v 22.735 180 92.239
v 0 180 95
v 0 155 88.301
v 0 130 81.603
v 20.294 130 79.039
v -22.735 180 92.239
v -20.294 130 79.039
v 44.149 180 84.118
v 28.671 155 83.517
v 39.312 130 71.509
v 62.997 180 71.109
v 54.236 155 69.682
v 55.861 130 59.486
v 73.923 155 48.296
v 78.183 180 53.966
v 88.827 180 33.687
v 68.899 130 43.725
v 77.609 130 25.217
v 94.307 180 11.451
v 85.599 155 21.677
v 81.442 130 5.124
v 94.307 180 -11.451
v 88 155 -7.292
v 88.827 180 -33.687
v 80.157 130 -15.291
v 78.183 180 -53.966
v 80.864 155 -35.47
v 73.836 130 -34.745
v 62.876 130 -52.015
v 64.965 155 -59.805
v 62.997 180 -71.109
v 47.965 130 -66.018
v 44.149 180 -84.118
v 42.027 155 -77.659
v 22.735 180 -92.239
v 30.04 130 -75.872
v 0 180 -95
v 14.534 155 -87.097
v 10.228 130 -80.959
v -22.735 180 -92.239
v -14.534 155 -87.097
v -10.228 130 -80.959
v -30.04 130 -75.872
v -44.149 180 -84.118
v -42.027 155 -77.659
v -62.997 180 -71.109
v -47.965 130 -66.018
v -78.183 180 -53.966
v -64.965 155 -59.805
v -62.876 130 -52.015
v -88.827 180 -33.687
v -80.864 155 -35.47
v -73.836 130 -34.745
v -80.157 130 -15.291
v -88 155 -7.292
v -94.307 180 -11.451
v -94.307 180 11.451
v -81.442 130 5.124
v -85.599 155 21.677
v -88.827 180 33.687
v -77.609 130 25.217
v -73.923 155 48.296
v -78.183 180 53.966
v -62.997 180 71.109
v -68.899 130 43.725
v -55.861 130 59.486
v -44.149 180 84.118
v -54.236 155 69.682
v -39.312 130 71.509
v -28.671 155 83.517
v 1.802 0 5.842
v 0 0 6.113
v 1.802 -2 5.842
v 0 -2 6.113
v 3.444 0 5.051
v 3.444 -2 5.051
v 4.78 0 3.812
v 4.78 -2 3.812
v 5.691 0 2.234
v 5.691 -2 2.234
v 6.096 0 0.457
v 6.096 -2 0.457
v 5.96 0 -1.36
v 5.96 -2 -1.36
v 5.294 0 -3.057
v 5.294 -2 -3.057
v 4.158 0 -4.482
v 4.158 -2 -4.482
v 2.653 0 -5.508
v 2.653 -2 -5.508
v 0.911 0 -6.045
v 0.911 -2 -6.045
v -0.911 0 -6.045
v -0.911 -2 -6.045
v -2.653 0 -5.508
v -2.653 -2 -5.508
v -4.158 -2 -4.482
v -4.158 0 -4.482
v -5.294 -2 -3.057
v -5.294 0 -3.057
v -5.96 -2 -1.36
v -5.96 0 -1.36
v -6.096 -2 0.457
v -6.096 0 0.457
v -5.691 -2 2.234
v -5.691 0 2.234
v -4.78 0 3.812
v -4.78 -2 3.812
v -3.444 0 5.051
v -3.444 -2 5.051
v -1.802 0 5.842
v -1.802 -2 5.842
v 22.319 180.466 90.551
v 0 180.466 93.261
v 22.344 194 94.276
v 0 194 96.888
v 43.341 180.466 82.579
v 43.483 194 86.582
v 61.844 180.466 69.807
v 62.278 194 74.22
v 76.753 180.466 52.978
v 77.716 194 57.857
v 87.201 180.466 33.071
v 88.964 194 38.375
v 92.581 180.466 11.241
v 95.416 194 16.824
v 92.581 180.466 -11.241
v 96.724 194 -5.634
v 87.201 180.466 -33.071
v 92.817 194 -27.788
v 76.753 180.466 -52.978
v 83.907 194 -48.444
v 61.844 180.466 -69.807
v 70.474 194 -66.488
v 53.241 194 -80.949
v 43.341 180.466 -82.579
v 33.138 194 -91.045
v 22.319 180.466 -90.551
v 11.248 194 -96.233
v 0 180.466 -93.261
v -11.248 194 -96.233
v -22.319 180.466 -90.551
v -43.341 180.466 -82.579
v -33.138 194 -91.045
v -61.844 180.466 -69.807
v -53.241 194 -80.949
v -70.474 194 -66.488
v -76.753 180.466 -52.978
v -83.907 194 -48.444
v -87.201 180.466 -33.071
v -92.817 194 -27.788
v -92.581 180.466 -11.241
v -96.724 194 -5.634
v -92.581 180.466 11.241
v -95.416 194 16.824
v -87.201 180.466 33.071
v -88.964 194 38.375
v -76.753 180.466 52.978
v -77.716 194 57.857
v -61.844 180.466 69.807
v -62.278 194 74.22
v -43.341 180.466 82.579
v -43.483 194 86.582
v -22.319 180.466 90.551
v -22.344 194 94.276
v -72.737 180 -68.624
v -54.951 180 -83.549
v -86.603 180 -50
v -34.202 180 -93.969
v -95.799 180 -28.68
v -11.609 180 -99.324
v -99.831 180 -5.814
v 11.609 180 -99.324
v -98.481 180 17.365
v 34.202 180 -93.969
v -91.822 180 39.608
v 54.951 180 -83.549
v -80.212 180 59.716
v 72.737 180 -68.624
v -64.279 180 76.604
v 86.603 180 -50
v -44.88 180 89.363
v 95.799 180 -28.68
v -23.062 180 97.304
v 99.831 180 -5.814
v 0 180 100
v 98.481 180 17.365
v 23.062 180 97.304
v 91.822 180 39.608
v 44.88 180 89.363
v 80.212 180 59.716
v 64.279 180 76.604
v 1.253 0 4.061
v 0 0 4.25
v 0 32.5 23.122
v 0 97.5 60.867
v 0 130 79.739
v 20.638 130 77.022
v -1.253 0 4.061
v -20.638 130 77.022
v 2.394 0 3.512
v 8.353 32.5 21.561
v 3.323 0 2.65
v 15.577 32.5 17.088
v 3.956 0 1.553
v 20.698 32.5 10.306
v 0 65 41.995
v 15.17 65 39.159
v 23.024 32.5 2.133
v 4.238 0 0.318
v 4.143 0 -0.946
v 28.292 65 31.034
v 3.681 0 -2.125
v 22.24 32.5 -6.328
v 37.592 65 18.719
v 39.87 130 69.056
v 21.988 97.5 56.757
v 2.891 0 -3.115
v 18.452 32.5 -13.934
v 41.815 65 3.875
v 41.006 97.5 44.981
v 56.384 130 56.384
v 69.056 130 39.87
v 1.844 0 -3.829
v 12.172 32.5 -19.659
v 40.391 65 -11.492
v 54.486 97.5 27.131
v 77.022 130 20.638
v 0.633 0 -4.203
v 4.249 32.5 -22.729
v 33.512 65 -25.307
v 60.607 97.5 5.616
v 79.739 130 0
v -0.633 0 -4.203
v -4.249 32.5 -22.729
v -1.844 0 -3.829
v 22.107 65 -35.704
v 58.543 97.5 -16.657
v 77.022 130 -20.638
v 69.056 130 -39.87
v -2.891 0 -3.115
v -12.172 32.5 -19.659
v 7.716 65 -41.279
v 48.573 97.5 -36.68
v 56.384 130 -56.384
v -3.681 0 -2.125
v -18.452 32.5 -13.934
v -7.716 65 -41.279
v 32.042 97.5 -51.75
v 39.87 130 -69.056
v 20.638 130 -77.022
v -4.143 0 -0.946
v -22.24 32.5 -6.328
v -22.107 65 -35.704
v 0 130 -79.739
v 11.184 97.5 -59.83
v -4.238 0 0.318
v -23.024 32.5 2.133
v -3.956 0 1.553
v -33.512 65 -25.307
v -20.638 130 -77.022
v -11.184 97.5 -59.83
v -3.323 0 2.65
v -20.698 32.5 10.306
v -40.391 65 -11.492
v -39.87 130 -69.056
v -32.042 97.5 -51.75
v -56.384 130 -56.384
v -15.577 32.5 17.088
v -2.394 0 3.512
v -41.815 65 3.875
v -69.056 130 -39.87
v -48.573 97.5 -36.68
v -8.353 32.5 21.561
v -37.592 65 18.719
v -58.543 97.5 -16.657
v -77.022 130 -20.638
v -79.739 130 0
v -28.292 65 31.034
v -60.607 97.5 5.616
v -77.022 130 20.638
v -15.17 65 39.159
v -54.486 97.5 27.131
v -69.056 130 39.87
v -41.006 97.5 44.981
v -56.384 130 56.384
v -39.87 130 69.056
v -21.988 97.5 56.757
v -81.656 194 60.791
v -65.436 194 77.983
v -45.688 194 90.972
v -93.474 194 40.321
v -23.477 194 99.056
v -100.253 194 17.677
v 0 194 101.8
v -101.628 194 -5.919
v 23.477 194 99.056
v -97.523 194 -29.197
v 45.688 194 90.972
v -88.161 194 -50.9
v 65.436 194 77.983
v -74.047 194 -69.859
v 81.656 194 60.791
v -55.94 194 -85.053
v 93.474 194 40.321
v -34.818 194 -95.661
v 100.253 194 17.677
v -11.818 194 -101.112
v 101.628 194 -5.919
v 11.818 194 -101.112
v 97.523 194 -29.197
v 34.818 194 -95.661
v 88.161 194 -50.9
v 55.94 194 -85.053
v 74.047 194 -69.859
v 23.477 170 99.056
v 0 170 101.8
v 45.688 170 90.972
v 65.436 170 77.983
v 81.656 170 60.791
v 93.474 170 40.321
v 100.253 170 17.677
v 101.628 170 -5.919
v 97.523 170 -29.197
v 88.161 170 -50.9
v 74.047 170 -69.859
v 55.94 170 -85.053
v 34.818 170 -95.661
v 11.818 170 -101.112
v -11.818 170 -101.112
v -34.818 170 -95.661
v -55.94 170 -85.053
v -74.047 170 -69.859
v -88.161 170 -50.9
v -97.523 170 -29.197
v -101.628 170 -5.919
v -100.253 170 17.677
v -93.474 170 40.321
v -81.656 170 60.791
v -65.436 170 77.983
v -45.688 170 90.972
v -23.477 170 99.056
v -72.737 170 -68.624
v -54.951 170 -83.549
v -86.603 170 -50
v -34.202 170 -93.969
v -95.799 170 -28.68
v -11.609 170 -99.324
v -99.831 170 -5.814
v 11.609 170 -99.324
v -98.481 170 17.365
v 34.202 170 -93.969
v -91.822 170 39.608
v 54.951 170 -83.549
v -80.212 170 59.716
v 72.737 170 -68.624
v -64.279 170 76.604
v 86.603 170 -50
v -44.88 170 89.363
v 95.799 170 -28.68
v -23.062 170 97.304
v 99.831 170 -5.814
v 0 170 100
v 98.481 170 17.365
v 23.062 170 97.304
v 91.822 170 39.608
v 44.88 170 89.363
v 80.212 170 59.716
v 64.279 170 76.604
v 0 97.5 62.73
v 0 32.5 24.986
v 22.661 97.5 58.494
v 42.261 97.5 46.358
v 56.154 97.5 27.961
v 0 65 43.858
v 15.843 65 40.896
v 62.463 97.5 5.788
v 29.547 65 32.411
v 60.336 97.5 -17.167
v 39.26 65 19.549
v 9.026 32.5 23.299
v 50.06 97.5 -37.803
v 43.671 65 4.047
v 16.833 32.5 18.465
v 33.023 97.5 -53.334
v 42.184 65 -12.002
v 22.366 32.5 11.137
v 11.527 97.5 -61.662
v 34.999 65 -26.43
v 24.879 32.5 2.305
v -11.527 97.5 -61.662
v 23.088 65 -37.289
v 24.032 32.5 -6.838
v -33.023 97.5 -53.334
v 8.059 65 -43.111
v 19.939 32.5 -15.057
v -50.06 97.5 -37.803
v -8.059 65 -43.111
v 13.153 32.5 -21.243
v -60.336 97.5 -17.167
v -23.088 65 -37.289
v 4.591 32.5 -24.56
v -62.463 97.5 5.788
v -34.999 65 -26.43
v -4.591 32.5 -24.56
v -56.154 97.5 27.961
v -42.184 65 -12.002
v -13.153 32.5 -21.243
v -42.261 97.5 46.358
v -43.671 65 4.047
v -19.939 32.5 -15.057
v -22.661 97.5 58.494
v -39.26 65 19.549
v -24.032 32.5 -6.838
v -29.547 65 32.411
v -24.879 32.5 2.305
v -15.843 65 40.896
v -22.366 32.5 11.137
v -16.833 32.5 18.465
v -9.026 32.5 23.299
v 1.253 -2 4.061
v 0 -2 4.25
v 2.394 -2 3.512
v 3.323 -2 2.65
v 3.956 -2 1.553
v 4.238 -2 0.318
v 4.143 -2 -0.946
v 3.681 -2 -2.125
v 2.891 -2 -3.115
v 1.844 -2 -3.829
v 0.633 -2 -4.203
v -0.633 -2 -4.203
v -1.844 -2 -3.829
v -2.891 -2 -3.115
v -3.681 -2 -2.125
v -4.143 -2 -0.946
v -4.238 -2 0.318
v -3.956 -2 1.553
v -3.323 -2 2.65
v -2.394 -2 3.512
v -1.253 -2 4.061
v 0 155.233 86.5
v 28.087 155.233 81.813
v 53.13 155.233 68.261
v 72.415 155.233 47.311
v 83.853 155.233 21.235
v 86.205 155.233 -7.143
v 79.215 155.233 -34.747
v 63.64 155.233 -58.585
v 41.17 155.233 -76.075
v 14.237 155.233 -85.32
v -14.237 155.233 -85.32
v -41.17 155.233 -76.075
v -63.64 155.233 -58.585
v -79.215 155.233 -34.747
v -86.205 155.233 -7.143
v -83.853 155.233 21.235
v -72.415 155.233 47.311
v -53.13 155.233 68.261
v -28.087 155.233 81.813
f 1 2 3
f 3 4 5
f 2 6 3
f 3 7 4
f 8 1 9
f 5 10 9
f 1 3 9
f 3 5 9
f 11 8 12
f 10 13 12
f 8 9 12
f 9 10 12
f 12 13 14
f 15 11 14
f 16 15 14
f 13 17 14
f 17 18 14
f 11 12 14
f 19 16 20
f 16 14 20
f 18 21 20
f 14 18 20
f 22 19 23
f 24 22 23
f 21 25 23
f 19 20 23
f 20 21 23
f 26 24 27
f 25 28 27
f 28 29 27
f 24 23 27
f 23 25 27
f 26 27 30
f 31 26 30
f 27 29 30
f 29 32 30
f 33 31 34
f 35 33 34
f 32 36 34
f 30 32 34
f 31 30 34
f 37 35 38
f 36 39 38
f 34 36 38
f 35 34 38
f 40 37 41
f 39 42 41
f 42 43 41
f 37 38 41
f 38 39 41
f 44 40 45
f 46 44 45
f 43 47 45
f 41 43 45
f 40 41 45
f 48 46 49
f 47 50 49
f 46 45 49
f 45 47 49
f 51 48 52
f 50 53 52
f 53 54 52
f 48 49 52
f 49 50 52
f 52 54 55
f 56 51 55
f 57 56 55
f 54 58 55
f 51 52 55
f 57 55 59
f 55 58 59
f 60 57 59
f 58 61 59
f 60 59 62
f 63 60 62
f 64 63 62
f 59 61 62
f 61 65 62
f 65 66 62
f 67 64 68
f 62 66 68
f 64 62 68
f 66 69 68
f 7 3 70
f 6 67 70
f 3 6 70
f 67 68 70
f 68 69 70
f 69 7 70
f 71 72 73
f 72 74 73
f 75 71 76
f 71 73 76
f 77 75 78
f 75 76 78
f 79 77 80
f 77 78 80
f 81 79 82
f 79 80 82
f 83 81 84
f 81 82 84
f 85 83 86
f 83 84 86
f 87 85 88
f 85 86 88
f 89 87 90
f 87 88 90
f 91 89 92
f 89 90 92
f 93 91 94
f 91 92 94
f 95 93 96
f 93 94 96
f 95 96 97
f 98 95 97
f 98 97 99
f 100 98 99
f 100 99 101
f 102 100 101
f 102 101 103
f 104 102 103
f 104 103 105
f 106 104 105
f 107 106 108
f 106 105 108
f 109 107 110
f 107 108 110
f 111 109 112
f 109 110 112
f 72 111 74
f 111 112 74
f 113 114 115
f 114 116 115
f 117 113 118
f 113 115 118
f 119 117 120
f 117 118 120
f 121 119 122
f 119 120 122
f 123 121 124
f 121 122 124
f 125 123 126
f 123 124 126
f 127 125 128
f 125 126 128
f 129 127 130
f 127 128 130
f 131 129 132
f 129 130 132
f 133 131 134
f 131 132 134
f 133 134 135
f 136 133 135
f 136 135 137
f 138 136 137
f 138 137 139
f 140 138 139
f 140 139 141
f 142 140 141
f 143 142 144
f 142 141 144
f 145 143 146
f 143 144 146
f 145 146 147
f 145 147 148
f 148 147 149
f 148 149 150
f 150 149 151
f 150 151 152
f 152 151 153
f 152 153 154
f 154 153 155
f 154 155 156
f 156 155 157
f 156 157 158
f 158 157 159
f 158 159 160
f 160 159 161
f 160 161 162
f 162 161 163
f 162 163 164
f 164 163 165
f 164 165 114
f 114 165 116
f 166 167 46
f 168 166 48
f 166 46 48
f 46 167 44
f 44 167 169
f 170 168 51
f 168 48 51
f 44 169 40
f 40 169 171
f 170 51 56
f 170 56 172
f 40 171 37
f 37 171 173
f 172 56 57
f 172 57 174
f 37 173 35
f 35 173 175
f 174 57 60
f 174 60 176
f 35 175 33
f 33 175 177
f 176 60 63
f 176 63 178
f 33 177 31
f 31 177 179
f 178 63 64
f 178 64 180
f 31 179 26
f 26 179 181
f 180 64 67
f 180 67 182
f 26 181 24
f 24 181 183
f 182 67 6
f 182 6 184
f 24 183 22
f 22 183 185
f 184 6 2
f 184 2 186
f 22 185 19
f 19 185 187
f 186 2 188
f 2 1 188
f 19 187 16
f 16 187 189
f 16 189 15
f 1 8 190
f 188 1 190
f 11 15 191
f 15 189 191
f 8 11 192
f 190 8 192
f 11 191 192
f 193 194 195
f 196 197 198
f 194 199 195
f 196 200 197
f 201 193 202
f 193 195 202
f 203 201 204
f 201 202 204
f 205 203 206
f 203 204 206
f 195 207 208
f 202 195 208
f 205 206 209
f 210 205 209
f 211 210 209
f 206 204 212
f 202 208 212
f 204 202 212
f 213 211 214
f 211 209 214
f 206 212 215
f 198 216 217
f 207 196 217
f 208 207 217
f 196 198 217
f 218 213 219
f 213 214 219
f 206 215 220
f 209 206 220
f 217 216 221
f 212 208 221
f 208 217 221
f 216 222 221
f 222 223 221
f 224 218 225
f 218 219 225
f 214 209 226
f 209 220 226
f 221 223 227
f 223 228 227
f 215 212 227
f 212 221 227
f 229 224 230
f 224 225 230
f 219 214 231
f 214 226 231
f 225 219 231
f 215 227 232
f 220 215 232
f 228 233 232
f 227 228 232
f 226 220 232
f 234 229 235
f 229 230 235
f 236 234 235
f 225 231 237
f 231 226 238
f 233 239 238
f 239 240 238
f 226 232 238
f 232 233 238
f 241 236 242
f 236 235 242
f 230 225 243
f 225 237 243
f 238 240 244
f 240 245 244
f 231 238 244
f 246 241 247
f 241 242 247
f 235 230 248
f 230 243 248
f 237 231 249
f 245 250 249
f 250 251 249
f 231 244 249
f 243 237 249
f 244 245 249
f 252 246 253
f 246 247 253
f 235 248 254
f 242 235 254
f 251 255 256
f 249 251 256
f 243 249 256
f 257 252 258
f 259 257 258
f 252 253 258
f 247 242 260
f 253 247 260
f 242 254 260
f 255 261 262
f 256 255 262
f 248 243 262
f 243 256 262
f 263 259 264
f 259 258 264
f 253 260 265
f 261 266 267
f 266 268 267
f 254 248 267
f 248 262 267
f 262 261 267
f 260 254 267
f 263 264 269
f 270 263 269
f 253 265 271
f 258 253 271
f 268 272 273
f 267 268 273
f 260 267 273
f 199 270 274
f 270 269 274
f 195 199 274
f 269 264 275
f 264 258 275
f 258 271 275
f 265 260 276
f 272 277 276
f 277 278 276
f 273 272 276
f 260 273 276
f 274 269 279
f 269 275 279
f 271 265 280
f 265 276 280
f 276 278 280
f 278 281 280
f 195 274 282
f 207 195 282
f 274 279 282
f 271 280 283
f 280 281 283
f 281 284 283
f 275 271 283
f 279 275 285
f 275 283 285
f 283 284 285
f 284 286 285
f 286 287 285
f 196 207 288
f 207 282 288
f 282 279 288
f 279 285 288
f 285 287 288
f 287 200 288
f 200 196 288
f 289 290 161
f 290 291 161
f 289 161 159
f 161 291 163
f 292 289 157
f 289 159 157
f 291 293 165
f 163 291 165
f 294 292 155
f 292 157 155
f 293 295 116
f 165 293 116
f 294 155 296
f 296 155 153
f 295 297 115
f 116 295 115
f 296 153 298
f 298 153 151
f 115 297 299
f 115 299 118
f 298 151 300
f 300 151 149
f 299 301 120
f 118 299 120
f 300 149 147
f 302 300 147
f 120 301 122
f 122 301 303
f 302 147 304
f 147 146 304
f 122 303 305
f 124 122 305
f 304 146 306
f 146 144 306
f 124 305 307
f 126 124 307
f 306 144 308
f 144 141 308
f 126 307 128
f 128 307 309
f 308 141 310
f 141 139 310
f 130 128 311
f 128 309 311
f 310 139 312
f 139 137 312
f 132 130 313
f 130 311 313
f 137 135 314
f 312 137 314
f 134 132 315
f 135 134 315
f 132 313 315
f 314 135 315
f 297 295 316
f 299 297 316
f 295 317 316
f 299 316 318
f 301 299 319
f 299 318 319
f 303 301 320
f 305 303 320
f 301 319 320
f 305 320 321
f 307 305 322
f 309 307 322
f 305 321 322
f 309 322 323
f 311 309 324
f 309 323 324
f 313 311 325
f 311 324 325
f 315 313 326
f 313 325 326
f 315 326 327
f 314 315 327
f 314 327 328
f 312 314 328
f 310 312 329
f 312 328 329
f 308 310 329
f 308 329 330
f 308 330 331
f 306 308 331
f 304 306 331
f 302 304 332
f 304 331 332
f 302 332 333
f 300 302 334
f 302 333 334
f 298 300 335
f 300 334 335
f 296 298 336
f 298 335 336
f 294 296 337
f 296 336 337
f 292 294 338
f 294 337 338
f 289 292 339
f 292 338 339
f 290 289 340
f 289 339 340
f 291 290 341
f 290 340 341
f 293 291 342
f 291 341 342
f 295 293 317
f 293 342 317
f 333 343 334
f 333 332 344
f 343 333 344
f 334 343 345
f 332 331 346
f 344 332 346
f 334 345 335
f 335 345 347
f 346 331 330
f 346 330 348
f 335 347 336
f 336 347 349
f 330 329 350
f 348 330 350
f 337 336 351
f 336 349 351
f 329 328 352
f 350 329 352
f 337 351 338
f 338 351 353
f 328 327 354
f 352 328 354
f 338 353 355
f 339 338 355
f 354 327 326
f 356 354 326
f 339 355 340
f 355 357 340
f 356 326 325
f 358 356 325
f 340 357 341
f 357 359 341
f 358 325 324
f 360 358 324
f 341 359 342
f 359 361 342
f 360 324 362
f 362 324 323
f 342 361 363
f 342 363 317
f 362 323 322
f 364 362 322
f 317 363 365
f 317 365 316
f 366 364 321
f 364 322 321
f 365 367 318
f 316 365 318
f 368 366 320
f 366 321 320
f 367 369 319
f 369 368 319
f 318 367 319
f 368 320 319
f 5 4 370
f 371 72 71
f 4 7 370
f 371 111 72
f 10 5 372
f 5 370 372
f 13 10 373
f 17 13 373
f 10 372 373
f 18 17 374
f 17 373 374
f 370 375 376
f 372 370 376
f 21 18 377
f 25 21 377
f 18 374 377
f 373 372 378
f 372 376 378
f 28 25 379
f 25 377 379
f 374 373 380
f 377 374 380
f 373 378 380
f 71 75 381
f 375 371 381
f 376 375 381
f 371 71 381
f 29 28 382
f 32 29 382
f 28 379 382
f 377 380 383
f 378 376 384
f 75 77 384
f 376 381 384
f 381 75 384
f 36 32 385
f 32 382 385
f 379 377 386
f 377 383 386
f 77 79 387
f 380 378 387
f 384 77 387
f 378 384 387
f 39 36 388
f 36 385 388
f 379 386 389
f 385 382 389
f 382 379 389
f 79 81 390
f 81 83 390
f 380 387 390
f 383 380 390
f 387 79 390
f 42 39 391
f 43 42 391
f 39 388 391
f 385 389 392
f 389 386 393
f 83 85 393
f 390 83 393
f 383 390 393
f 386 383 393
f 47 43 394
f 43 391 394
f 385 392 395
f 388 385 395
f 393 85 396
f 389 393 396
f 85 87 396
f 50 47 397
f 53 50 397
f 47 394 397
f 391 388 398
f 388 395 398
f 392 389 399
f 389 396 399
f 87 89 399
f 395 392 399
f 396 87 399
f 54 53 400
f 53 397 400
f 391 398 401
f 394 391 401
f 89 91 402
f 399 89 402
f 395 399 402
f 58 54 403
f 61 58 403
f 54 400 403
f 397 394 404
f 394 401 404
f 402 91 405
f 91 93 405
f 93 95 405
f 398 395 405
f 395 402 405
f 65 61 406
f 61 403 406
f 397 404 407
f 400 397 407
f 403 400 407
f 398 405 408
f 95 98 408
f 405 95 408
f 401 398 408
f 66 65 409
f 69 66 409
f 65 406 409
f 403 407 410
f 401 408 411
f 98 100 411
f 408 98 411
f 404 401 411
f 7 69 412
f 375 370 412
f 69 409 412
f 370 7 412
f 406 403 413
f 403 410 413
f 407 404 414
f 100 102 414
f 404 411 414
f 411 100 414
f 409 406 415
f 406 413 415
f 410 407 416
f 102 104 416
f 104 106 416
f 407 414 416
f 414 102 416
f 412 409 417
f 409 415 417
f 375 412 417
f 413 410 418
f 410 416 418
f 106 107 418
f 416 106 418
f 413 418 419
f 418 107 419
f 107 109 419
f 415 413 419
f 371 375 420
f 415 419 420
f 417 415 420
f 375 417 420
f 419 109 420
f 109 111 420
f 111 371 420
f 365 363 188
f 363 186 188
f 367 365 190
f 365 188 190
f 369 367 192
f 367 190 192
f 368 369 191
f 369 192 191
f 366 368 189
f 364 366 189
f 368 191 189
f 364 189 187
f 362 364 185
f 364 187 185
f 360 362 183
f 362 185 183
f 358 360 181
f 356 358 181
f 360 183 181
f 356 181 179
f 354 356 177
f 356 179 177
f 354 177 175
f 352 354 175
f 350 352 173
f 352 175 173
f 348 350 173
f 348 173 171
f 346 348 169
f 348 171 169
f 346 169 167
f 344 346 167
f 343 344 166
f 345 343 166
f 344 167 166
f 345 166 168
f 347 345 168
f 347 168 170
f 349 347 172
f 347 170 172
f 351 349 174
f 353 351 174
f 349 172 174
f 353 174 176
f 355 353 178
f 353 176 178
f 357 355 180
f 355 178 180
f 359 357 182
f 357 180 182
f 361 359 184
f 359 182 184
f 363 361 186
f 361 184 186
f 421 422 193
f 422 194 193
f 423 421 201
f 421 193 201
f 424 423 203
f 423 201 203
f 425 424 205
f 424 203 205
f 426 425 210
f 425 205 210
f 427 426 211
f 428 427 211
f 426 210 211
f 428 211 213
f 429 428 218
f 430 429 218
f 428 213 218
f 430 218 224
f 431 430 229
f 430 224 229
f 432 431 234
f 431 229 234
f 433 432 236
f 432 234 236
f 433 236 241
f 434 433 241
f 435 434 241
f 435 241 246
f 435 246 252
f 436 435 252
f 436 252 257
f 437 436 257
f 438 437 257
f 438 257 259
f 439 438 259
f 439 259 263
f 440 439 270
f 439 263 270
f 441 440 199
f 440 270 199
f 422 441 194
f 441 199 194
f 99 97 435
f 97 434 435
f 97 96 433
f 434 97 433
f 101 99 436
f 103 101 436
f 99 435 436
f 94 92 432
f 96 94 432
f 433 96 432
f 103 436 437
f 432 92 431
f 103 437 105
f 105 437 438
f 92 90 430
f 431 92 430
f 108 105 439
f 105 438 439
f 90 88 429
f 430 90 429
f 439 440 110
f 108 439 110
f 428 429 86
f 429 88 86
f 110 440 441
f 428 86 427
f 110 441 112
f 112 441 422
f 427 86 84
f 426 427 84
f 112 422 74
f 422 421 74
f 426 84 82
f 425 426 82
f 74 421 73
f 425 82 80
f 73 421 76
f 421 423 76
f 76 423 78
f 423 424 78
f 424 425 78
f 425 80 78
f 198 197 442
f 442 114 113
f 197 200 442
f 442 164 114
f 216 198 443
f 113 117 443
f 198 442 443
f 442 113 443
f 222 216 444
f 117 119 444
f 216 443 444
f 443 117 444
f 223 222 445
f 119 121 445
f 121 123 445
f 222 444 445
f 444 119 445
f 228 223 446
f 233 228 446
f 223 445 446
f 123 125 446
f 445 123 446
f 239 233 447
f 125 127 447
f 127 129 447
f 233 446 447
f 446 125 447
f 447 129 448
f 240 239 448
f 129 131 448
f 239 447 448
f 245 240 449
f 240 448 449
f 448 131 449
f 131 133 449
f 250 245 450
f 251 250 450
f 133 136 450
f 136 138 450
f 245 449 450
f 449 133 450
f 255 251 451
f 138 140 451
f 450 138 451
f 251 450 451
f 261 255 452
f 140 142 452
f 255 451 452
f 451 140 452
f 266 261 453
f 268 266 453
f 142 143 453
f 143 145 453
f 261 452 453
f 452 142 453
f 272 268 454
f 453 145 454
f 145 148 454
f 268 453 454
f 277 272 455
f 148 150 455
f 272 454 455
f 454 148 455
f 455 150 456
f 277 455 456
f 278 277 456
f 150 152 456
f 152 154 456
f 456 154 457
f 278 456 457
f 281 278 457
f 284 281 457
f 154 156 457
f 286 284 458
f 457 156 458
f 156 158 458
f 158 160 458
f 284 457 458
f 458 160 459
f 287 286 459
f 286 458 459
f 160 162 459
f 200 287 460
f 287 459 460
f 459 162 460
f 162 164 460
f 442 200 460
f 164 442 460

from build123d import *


with BuildPart() as part:
    # Schizzo1 → Rivoluzione1 (revolve)
    with BuildSketch(Plane(origin=(0, 0, 0), x_dir=(0, 0, -1), z_dir=(1, 0, 0))):
        Polygon((-100, 180), (-95, 180), (-81.602540378, 130), (-6.113497125, 0), (-6.113497125, -2), (-4.25, -2), (-4.25, 0), (-79.739043254, 130), (-93.261333513, 180.465874281), (-96.887791569, 194), (-101.8, 194), (-101.8, 170), (-100, 170), align=None)
    revolve(axis=Axis((0, 0, 0), (0, 1, 0)))


solid = part.part
